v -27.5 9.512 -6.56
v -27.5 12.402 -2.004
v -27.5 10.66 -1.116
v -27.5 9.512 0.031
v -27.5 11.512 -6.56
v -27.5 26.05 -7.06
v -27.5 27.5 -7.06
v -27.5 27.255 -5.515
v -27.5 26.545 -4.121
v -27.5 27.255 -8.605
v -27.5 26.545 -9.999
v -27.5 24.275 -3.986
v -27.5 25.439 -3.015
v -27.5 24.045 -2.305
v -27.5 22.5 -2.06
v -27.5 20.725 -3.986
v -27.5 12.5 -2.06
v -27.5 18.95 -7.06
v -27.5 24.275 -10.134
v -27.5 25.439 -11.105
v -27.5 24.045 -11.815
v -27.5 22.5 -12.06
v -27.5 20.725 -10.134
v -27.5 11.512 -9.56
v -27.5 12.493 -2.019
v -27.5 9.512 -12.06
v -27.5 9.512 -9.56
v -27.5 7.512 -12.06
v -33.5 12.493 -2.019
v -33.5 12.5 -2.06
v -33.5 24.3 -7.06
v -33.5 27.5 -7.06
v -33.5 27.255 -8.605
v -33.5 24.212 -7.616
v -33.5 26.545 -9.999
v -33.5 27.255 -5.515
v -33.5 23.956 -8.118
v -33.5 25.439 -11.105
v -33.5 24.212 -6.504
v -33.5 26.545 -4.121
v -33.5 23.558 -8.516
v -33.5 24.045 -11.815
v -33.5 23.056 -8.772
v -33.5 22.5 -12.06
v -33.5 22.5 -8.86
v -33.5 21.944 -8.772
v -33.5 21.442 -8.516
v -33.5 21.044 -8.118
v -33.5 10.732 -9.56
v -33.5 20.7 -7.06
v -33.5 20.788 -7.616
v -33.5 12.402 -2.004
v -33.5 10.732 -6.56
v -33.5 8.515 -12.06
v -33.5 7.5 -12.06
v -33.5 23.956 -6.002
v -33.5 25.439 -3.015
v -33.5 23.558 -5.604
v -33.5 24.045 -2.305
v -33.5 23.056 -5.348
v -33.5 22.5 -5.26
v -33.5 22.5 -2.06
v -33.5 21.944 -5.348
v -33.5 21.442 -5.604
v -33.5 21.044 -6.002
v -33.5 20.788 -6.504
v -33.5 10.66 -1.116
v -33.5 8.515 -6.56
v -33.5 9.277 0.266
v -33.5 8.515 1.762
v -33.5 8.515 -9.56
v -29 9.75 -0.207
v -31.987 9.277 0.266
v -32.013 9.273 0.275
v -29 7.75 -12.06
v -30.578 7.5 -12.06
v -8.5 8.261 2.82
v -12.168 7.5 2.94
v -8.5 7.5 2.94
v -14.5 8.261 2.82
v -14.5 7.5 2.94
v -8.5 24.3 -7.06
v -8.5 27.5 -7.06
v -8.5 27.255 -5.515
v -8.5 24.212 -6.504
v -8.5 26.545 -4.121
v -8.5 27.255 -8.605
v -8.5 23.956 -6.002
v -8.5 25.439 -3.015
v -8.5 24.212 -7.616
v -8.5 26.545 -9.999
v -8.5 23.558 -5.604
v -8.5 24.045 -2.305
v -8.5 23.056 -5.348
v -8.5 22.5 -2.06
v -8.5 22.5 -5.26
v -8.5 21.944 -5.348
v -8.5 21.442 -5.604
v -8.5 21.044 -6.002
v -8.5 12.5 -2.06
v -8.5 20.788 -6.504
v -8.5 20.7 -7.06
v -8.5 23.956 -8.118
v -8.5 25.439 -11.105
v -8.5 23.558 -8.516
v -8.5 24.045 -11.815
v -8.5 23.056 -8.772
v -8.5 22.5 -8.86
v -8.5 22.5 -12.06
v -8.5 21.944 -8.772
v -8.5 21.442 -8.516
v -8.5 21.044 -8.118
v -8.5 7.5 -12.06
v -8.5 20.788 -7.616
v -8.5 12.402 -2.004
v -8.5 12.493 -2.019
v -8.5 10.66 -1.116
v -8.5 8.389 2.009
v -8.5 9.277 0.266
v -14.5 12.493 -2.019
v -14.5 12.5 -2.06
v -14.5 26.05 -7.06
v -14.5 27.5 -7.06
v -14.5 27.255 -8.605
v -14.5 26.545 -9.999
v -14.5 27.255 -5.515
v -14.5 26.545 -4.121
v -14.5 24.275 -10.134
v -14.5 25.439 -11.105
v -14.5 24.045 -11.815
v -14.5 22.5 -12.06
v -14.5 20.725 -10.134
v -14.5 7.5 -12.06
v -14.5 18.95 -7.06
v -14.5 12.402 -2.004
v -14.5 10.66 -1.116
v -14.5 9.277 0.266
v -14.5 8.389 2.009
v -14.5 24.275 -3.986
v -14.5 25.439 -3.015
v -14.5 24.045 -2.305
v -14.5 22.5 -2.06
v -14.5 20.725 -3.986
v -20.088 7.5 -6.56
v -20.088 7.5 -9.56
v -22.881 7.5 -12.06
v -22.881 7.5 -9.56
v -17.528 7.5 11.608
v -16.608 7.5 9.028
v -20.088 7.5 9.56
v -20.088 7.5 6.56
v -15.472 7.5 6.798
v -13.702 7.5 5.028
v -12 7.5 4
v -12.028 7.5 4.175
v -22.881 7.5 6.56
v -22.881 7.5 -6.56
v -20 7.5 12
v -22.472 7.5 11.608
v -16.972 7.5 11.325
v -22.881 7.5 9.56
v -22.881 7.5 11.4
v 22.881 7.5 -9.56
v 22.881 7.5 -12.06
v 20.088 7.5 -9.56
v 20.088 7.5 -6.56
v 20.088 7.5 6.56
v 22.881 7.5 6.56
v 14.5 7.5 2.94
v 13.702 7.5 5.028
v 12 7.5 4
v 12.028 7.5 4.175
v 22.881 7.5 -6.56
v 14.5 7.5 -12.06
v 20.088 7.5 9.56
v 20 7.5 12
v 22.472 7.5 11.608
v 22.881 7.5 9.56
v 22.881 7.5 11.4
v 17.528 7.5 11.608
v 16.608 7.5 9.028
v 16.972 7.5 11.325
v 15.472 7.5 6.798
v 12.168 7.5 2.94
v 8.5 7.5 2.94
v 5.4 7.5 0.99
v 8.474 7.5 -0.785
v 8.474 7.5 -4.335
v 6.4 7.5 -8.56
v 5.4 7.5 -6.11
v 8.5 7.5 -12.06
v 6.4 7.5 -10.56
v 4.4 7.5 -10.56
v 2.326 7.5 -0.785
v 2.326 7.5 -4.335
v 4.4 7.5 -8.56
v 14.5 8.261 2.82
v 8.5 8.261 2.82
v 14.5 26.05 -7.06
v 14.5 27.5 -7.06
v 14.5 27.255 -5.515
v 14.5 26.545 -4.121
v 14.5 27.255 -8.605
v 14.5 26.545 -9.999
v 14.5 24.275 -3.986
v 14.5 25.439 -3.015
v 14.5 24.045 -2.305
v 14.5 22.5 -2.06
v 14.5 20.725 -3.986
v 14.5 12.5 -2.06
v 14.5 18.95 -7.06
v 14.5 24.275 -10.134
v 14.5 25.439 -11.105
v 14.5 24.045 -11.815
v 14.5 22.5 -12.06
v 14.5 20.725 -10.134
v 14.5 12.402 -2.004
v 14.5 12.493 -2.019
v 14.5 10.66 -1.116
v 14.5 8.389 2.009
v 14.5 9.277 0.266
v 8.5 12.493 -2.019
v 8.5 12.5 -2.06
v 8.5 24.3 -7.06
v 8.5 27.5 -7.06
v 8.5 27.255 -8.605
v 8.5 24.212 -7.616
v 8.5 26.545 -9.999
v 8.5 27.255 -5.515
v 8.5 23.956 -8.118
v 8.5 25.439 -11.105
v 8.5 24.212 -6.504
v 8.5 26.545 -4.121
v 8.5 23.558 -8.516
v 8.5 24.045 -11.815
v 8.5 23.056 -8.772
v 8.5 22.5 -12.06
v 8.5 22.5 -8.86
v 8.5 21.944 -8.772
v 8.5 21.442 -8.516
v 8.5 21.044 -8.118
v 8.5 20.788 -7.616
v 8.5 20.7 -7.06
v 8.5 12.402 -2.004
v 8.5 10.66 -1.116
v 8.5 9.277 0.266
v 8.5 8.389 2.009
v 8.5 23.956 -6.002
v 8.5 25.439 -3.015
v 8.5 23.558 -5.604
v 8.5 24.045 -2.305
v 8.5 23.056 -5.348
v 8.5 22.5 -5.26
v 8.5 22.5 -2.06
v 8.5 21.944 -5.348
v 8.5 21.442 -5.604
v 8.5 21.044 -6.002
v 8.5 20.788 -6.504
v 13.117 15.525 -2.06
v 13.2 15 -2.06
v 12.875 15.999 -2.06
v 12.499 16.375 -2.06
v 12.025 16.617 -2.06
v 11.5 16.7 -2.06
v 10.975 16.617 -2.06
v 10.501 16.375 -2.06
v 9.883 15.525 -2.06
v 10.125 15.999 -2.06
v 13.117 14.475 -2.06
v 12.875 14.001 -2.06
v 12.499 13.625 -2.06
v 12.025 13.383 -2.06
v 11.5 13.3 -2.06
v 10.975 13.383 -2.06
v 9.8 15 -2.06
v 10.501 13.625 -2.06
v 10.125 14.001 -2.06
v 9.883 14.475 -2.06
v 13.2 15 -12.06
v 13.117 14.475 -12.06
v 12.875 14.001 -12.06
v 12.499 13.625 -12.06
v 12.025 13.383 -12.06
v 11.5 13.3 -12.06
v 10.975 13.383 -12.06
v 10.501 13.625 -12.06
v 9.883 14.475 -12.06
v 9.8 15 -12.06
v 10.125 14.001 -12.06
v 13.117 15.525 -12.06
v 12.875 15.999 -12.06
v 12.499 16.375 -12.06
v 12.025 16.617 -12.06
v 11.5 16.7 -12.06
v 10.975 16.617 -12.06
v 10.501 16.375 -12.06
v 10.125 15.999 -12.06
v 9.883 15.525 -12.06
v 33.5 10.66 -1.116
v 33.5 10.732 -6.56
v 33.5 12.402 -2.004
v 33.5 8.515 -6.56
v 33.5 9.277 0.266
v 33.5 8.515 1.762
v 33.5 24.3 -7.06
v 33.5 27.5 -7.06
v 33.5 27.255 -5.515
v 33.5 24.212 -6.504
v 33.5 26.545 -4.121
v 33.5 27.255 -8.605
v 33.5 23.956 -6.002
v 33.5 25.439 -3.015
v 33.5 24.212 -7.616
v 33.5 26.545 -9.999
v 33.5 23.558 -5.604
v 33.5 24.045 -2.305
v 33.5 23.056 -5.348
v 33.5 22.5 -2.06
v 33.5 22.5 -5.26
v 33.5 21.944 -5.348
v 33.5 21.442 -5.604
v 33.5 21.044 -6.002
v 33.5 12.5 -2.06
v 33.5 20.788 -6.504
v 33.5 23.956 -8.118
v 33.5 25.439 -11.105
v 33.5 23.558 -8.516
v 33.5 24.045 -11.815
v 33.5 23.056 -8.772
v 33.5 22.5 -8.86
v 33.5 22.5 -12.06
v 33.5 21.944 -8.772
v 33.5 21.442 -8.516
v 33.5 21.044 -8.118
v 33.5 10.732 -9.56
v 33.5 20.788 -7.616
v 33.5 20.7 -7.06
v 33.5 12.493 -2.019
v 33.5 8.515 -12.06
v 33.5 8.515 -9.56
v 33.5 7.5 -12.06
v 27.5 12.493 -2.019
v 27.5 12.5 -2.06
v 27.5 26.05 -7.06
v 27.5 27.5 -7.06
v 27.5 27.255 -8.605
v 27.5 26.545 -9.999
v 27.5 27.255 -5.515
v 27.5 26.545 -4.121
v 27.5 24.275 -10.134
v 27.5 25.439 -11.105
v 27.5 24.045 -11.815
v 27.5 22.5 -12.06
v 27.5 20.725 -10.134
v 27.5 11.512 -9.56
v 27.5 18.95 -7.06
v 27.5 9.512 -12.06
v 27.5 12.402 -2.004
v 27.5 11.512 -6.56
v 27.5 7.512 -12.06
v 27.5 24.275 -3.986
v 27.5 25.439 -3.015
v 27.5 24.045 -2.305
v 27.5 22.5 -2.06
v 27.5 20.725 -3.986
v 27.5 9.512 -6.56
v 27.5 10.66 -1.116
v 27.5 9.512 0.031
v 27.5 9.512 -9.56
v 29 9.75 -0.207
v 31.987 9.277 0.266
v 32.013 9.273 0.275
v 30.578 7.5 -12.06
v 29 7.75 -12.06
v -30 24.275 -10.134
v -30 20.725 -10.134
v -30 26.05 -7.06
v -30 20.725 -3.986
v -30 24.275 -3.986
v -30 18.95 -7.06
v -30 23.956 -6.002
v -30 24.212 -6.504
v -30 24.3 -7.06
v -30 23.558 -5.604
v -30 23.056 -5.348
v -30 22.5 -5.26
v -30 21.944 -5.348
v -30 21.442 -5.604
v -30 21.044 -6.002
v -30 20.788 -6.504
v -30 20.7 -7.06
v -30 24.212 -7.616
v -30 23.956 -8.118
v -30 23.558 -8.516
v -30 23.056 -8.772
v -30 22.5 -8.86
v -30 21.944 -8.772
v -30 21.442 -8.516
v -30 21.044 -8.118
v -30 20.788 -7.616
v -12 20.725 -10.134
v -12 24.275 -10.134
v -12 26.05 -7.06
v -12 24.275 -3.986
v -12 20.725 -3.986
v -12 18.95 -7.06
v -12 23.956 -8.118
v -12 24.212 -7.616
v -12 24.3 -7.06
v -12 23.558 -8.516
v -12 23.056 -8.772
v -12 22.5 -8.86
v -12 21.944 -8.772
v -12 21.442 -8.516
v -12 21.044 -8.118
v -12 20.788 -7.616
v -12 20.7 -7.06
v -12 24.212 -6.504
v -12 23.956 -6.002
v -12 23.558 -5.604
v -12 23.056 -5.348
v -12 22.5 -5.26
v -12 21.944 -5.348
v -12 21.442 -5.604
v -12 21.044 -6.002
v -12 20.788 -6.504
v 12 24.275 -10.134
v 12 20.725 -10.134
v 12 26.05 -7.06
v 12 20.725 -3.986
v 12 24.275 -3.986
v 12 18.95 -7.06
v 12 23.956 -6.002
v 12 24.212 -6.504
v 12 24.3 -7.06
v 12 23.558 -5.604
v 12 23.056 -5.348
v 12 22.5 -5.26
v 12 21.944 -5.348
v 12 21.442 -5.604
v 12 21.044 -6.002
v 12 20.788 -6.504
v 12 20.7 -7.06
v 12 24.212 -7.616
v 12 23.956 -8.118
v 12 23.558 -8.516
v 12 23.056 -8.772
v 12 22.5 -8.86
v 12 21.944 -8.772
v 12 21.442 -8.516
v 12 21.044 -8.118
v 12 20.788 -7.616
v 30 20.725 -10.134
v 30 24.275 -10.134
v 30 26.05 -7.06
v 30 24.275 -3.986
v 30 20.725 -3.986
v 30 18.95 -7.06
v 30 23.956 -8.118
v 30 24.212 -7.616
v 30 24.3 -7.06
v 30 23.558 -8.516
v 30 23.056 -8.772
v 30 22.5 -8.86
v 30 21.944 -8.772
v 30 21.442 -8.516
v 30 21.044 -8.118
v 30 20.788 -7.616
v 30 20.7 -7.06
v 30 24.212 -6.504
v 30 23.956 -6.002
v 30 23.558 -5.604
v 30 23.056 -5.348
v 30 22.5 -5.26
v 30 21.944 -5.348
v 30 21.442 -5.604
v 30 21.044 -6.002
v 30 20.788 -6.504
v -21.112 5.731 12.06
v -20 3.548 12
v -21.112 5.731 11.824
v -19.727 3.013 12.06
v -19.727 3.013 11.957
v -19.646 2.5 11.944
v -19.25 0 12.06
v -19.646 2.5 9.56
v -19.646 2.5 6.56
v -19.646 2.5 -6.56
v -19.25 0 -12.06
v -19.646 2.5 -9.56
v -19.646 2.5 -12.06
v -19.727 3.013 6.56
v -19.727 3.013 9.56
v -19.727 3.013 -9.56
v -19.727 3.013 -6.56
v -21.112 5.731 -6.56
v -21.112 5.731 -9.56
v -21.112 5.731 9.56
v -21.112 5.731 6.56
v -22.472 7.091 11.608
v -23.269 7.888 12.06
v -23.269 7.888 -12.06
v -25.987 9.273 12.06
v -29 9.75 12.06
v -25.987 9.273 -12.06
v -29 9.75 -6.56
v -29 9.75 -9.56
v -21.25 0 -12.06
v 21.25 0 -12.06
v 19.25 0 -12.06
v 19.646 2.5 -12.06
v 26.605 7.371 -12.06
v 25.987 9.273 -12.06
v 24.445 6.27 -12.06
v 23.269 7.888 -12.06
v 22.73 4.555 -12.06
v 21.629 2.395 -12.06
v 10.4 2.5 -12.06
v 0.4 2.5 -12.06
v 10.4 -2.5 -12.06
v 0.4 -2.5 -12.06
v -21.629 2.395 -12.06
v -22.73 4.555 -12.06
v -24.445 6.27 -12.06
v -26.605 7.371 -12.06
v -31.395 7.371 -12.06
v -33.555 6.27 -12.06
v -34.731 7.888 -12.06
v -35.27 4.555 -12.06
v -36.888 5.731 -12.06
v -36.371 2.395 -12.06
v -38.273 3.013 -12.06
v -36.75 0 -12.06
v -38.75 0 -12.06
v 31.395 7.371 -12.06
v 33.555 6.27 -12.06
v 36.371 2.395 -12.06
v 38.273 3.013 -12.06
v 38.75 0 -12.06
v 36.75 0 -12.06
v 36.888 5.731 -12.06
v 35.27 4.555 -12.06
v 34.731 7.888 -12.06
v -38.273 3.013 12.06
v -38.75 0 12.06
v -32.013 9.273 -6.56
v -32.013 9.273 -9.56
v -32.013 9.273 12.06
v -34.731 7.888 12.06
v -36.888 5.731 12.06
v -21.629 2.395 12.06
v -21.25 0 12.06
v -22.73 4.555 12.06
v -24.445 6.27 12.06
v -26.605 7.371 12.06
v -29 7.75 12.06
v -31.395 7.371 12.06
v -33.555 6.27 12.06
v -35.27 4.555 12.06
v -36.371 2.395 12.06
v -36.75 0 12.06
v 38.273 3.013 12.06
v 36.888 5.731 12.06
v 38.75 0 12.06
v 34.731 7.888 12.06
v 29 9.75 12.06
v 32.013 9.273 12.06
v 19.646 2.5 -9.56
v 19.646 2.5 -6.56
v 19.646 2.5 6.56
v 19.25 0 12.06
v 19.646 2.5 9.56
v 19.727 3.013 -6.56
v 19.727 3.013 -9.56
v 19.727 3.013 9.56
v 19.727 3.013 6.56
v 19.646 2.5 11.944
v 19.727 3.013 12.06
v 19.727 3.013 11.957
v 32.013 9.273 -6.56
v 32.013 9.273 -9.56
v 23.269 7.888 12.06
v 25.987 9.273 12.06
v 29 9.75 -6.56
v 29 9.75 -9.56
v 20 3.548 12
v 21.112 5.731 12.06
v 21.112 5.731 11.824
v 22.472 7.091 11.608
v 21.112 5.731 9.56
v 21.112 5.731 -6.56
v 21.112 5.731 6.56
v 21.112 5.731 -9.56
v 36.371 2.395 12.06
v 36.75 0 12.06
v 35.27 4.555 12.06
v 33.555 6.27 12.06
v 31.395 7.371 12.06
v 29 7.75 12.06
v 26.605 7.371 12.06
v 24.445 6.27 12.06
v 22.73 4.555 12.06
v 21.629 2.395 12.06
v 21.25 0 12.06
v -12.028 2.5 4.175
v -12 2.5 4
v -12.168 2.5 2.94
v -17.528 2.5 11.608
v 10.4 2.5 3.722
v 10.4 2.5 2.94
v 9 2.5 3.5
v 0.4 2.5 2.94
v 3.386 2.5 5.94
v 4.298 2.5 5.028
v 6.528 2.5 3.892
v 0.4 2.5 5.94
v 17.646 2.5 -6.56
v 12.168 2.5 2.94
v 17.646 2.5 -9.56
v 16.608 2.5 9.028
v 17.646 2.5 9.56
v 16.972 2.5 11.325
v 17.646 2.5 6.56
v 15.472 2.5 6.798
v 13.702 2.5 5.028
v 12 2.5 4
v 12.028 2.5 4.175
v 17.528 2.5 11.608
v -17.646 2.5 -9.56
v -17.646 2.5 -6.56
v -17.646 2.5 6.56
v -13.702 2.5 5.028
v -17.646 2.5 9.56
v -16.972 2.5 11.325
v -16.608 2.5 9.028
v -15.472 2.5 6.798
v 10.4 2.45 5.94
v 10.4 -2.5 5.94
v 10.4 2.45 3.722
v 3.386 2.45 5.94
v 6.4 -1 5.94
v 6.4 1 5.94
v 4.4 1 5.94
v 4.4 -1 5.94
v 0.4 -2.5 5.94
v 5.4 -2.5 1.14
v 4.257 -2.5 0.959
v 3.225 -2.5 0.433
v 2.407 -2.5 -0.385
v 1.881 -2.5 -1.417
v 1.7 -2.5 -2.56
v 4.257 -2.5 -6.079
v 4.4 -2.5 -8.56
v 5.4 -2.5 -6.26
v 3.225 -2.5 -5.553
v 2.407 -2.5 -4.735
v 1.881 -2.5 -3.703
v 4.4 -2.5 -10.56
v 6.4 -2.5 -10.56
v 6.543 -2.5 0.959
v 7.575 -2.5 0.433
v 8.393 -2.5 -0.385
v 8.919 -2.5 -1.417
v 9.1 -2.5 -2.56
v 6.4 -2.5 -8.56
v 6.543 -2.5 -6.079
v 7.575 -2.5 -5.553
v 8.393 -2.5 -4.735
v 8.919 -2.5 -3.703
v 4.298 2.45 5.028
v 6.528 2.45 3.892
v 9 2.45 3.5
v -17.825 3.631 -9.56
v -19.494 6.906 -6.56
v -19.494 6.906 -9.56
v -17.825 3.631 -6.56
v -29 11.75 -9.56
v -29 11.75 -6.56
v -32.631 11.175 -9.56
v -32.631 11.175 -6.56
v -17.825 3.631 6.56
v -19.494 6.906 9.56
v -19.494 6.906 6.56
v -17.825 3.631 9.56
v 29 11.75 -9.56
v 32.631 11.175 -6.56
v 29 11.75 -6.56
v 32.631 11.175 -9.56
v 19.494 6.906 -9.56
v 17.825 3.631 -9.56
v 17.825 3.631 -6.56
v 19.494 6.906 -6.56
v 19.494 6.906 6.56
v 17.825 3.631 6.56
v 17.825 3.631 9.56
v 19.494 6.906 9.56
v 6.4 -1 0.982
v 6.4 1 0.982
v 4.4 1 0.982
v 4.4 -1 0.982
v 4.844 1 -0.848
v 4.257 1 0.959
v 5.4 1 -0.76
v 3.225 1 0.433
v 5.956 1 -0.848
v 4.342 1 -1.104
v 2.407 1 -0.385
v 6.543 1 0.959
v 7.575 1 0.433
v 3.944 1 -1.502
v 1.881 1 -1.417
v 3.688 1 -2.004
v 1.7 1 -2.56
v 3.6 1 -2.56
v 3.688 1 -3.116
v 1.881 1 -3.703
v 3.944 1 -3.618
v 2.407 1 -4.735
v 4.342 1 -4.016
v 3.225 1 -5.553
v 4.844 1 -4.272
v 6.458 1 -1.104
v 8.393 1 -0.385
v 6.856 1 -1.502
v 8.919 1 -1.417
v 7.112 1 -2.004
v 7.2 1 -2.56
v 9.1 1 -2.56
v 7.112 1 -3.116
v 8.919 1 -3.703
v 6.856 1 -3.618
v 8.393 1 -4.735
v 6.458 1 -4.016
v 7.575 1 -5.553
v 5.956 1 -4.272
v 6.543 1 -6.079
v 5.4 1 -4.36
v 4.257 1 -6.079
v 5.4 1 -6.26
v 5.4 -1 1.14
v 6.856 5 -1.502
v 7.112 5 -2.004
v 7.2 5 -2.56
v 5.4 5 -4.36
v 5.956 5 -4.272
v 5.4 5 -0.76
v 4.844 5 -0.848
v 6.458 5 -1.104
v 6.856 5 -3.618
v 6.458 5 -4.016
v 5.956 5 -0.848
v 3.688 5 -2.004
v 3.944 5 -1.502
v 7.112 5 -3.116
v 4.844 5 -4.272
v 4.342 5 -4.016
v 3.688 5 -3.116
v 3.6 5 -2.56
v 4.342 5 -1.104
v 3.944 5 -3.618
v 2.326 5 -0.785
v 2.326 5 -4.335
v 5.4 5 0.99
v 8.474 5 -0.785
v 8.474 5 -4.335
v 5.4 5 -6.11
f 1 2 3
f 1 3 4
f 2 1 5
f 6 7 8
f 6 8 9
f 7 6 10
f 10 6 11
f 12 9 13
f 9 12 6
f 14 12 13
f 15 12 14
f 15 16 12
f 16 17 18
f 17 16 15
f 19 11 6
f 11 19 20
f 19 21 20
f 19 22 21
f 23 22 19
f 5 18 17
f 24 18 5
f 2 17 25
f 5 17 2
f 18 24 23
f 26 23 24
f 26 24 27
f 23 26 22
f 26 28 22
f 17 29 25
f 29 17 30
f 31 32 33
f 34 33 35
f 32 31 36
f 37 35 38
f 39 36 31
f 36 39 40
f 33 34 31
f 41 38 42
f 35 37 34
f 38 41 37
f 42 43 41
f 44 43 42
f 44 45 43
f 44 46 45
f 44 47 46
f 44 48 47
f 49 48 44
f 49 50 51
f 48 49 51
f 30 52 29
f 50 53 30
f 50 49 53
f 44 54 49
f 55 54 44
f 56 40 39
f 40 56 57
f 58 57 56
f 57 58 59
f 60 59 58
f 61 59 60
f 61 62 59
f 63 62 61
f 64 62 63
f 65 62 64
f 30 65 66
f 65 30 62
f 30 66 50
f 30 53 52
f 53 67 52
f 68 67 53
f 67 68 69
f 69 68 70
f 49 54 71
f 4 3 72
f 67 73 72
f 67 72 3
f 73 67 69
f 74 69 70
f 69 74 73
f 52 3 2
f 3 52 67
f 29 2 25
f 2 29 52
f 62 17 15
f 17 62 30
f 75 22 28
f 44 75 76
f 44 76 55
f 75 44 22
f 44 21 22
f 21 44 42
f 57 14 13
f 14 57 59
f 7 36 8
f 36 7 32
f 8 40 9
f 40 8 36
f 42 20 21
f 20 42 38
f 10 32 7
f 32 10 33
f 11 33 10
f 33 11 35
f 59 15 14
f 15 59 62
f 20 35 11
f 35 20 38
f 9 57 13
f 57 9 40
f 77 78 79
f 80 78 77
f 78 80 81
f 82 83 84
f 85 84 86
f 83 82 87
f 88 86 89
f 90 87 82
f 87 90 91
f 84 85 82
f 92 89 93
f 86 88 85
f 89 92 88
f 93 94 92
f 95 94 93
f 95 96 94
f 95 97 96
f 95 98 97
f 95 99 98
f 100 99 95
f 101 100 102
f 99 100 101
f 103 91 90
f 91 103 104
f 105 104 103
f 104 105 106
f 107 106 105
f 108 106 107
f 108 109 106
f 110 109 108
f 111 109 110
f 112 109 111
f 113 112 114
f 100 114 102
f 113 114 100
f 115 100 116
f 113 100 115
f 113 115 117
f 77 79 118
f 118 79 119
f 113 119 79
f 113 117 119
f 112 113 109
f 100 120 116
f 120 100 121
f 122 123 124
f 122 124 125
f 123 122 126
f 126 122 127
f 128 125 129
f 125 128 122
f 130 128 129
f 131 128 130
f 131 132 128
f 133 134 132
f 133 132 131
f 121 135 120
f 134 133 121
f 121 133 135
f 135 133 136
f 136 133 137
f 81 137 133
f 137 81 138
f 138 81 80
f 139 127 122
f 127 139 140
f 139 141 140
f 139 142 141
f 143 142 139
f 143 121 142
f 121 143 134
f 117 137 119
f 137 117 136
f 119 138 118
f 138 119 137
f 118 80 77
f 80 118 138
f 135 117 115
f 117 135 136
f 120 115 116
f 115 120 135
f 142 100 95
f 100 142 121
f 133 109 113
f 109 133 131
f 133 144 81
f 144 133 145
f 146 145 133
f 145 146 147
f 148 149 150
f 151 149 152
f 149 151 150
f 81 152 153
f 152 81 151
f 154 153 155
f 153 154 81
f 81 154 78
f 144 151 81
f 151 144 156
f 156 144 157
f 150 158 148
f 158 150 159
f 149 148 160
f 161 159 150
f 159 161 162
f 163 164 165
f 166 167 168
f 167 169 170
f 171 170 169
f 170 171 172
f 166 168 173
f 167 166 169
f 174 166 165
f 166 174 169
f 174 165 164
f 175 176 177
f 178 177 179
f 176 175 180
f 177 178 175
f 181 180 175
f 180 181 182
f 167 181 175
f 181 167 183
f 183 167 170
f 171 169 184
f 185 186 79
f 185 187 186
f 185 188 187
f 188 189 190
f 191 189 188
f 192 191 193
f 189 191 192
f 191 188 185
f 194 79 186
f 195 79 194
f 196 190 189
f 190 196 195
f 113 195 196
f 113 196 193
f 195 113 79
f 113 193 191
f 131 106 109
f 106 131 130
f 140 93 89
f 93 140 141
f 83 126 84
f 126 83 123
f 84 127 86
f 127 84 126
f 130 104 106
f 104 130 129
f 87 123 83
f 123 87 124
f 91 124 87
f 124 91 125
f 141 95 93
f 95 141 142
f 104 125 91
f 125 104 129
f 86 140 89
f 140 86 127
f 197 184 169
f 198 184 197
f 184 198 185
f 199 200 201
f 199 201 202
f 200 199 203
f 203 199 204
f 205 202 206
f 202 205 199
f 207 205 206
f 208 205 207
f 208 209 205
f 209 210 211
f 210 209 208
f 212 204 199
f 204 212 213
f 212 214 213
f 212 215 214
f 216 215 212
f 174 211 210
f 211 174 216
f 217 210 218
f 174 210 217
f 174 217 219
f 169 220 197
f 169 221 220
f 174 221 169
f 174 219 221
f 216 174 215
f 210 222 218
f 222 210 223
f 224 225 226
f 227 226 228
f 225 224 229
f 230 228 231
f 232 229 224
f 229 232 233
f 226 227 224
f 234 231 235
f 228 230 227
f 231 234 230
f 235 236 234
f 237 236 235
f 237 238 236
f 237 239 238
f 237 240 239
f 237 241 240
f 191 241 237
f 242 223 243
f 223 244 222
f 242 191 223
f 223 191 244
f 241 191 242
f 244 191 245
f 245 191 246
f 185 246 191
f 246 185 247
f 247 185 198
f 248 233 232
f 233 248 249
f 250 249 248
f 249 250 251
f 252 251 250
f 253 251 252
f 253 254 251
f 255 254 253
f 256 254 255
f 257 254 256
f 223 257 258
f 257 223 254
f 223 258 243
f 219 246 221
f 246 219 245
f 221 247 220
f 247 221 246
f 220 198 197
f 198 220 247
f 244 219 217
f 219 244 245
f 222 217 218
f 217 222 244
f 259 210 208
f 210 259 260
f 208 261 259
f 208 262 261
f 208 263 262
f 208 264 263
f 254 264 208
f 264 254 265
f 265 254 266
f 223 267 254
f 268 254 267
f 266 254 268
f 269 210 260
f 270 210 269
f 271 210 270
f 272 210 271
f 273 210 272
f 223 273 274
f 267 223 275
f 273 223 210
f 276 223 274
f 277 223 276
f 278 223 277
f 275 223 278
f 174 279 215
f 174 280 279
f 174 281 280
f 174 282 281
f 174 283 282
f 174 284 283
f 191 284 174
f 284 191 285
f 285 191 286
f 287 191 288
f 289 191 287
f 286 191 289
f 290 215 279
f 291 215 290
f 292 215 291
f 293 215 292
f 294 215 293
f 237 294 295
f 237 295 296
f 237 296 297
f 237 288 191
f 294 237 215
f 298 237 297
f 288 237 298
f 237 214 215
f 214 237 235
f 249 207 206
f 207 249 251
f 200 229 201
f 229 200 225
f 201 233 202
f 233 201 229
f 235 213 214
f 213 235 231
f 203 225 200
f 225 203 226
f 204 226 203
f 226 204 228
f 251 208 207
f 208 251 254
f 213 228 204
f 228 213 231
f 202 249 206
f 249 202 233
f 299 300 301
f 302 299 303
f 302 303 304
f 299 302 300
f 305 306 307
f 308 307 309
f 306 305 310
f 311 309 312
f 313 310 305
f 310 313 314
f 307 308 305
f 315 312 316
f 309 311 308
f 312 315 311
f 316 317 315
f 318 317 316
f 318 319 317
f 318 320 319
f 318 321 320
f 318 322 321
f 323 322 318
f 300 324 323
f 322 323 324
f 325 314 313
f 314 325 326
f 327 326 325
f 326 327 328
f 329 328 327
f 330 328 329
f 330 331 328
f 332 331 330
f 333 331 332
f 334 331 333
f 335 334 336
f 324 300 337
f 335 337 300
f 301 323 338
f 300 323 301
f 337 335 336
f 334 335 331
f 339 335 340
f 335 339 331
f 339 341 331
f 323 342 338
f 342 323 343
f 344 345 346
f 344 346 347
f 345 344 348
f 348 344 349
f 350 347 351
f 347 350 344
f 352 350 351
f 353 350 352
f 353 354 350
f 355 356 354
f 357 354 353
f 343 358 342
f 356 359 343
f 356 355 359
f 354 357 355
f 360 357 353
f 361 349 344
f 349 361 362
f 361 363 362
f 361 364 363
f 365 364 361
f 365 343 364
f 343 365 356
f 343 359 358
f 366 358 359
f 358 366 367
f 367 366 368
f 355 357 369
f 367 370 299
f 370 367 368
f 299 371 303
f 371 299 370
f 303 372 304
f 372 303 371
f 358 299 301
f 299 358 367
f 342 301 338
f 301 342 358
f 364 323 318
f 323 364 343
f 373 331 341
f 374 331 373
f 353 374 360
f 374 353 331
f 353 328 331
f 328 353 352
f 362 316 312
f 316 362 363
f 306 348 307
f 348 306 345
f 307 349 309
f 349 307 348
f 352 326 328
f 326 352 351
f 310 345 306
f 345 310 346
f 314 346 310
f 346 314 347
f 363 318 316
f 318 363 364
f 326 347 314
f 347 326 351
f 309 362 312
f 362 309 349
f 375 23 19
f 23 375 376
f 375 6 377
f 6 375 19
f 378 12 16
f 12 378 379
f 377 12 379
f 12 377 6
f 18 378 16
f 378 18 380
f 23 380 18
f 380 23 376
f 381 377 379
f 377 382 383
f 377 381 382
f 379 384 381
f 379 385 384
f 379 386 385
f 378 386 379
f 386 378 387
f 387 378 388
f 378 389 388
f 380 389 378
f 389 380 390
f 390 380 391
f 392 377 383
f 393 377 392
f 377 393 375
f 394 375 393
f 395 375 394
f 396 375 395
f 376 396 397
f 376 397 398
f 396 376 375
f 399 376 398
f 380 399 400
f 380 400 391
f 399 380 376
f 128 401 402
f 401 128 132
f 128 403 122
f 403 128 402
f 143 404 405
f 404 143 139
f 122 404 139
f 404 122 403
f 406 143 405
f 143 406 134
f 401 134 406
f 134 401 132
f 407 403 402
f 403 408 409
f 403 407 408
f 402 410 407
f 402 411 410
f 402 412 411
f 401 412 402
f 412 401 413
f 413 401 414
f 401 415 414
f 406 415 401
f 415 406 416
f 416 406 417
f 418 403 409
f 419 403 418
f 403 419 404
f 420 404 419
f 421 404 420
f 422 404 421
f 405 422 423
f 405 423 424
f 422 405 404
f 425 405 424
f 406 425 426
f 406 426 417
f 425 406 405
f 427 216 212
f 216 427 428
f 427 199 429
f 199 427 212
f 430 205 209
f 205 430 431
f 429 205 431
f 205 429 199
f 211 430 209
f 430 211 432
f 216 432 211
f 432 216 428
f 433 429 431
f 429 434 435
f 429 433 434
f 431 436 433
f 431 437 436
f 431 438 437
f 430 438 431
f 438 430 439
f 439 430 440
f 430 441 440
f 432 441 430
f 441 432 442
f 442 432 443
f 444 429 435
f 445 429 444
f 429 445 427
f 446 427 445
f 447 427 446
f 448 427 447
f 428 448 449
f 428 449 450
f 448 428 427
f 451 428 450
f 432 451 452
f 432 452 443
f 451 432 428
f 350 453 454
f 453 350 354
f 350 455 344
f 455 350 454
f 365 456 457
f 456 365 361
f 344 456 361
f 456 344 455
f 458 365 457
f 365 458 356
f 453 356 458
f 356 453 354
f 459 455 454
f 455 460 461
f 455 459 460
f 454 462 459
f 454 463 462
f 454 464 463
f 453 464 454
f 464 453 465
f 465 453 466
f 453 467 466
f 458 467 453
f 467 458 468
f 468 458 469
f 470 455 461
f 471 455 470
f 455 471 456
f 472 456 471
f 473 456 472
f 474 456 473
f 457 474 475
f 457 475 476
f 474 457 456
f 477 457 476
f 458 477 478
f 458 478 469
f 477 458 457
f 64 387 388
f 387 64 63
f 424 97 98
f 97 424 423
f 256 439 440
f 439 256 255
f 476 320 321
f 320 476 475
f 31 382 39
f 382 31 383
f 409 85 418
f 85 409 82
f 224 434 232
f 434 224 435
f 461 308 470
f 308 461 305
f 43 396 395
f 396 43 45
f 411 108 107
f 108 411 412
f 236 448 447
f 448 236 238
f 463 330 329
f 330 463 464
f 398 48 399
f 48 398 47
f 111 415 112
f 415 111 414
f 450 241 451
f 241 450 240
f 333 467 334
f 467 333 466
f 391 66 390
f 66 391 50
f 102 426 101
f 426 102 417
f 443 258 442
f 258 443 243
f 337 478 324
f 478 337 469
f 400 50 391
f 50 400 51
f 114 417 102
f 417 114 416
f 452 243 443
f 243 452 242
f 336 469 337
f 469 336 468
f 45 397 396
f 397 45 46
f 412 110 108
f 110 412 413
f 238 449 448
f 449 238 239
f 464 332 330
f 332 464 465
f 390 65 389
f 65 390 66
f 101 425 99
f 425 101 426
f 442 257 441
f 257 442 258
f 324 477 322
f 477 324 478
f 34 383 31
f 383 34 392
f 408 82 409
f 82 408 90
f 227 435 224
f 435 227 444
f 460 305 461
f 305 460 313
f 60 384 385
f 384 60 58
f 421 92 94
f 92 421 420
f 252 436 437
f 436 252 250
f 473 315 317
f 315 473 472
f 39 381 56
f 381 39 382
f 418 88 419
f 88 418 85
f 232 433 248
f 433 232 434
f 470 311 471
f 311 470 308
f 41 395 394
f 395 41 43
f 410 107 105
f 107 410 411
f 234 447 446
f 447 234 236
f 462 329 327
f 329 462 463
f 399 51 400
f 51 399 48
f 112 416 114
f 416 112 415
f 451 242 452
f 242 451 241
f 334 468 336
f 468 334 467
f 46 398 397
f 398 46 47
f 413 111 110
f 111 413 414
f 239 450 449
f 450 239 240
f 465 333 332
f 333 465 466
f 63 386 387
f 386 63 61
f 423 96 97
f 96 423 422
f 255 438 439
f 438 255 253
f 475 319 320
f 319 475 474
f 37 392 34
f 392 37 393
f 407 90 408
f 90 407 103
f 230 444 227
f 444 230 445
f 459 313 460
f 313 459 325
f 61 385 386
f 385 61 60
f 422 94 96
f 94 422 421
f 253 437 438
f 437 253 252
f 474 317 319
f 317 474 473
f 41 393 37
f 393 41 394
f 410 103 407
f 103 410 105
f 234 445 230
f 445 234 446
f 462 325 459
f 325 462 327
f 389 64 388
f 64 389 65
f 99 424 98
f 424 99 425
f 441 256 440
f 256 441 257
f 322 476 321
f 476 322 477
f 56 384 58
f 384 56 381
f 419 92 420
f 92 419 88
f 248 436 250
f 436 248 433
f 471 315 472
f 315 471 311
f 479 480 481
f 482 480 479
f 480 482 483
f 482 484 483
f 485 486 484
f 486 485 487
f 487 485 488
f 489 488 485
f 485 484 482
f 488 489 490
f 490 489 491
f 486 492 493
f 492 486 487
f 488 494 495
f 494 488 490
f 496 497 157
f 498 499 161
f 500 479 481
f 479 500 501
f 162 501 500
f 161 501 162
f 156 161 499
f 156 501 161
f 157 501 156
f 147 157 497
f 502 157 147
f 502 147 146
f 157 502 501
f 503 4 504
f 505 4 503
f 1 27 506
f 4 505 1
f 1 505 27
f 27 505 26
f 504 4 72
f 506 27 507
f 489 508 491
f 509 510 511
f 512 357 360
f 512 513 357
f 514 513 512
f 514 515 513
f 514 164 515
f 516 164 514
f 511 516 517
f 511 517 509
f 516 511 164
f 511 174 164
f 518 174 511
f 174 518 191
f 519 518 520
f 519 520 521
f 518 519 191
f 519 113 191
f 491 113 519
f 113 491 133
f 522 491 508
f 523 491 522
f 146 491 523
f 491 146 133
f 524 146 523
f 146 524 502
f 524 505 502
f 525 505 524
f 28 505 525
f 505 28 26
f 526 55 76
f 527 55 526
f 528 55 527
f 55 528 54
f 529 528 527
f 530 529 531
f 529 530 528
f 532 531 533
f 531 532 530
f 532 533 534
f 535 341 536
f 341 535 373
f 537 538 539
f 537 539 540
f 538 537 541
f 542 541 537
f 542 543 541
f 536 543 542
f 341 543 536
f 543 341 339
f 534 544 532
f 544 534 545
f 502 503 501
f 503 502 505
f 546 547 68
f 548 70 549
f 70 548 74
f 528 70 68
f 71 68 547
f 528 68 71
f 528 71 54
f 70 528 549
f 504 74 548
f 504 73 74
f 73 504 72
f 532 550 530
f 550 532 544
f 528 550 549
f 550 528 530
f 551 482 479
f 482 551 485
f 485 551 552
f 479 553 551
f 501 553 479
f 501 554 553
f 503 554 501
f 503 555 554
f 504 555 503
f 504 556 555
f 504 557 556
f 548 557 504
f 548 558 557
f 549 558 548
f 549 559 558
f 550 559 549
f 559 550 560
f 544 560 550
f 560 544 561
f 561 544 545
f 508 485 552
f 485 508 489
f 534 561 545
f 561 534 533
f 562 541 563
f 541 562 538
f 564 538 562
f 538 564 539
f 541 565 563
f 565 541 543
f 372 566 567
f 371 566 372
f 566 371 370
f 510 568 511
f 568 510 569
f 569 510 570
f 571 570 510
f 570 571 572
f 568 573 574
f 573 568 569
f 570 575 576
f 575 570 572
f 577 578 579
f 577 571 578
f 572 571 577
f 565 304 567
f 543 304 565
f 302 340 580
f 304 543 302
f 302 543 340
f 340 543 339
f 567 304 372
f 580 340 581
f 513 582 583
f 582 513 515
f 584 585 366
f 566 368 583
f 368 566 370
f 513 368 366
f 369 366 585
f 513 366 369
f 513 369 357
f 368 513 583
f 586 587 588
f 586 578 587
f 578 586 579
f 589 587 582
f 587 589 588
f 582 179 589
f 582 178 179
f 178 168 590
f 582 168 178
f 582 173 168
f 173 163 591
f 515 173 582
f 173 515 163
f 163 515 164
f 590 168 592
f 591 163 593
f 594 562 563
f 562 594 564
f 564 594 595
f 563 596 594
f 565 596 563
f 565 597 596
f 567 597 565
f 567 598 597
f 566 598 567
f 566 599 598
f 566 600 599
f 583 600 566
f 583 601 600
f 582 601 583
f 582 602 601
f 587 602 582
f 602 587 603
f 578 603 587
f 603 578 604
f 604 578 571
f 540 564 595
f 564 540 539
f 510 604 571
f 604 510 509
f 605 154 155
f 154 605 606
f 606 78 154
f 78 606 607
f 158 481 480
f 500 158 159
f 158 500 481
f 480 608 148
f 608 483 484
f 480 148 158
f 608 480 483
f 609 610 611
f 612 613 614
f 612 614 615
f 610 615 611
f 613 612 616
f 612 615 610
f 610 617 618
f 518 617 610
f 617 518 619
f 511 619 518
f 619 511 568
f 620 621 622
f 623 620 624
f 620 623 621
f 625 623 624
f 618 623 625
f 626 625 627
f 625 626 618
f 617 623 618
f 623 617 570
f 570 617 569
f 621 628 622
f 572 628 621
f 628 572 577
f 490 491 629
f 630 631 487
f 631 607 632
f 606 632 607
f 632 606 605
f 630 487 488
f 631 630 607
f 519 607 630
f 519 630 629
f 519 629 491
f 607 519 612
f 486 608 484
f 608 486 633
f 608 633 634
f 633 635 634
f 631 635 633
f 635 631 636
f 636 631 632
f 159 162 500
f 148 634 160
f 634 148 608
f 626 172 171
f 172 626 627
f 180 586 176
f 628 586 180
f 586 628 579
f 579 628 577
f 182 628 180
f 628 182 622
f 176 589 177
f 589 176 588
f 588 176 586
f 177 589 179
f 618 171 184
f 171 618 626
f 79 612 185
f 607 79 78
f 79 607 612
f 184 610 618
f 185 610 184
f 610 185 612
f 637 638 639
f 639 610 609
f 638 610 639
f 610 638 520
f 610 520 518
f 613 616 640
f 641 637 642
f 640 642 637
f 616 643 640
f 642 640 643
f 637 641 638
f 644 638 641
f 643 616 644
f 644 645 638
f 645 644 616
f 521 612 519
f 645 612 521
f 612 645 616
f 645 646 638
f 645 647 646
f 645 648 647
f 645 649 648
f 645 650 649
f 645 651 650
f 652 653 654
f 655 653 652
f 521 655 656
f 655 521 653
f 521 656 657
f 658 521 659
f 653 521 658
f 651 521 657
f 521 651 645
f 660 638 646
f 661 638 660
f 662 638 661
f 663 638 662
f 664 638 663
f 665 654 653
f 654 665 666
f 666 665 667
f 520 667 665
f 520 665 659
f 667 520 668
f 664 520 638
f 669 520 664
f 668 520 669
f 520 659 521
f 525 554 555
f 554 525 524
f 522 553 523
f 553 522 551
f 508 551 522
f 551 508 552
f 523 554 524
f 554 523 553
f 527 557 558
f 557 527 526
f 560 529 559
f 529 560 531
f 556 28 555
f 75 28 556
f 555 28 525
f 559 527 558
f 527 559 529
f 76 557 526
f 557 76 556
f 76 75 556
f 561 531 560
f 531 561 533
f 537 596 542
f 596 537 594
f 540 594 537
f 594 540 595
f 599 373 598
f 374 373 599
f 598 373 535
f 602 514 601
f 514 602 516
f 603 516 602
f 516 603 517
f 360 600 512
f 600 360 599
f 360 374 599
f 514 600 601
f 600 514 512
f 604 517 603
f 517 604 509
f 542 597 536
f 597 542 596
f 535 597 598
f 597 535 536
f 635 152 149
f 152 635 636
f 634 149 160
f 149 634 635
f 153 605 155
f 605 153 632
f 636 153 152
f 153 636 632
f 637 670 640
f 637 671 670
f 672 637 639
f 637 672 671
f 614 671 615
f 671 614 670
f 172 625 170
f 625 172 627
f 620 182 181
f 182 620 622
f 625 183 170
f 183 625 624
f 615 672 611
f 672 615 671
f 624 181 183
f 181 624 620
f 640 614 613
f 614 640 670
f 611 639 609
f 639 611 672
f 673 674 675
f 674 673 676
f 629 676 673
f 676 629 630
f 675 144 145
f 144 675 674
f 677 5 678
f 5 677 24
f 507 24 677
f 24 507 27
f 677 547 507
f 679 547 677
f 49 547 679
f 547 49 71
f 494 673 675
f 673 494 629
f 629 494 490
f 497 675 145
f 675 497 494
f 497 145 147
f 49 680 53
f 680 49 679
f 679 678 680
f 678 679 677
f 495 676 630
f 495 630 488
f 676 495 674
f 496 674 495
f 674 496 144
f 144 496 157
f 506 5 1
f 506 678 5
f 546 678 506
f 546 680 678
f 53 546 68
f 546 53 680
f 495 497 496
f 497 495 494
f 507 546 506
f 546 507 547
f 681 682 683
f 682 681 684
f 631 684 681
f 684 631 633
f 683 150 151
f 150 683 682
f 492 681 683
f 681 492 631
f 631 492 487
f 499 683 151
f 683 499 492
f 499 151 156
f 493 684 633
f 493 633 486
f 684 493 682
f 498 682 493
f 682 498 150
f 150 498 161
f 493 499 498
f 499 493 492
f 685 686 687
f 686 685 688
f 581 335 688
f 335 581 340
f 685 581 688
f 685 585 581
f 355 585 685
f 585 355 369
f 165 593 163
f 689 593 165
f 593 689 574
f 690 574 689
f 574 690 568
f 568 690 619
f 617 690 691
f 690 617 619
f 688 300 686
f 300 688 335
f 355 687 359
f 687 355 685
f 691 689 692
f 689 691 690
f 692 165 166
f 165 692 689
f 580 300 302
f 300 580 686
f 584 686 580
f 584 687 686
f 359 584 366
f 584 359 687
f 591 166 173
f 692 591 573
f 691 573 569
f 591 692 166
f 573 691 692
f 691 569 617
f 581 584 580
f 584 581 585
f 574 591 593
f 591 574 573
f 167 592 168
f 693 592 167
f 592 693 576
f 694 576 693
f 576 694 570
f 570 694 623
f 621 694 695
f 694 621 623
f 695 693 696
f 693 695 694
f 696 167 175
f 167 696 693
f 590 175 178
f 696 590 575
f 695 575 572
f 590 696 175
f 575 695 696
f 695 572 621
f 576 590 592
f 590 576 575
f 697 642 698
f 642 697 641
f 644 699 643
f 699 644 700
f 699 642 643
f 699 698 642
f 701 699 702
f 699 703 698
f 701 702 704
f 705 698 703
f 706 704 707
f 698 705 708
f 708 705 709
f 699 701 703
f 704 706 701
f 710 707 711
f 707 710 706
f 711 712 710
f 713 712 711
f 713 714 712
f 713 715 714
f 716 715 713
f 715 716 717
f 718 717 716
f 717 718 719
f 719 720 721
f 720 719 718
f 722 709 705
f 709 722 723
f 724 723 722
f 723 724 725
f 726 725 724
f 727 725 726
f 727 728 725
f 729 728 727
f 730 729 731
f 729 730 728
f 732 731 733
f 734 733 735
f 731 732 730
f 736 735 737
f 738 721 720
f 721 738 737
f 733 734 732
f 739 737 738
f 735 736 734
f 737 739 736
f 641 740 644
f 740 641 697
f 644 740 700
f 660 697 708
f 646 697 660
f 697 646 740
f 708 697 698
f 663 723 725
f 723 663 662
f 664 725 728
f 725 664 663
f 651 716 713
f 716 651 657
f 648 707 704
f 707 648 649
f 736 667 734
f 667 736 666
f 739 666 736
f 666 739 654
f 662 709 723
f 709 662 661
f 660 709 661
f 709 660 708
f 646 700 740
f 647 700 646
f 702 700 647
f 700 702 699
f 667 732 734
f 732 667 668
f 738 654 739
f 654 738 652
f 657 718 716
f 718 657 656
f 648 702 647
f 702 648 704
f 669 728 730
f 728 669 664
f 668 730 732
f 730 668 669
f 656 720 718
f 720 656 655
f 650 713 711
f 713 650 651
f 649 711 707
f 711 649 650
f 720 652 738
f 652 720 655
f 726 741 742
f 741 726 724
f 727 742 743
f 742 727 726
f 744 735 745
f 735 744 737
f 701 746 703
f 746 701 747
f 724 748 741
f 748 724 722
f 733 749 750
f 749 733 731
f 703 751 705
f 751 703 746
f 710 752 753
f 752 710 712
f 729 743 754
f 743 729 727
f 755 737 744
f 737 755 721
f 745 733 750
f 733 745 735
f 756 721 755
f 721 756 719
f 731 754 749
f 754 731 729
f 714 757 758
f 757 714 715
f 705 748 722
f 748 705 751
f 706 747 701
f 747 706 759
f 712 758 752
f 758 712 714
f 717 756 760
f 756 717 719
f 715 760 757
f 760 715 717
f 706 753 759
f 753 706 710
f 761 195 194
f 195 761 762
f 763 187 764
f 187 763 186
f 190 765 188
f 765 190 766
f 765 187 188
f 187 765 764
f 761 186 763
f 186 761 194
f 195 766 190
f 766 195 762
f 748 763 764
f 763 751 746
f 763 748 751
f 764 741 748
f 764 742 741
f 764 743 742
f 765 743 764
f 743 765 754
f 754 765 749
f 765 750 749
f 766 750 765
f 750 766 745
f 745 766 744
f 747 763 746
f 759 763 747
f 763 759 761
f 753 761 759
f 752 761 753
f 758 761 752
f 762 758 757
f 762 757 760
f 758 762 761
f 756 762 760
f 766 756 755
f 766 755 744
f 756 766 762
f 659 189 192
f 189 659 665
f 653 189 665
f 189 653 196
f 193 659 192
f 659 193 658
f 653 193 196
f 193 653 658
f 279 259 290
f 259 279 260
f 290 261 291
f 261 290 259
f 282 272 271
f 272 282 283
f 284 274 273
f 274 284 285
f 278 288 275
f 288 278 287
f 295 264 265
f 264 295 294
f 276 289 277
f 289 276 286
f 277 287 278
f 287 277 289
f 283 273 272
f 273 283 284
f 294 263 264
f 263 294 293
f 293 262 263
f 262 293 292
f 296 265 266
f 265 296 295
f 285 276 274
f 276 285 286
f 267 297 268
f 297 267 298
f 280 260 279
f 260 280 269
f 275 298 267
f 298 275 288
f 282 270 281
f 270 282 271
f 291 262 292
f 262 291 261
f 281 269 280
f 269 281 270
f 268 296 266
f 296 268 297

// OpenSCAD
// file: hotend_clamp.scad
include<configuration.scad>;

$fn=60;
clamp_h = 2.31;
ubis_gap = 11.65;


module clamp(){
	difference(){
		union(){
			for(i=[0:120:240]){
				hull(){
					rotate([0,0,i]) translate([33,0,0]) cylinder(r=6,h=clamp_h,center=true);
					cylinder(r=6,h=clamp_h,center=true);
				}
			}
			cylinder(r=ubis_gap/2+5,h=clamp_h,center=true);
		}


		for(i=[0:120:240]){
			rotate([0,0,i]) translate([32,0,0]) cylinder(r=M4/2,h=clamp_h+1,center=true);
		}
		
		cylinder(r=ubis_gap/2,h=clamp_h+1,center=true);
		hull(){
			cylinder(r=ubis_gap/2-1,h=clamp_h+1,center=true);
			translate([-30,0,0]) cylinder(r=ubis_gap/2-1,h=clamp_h+1,center=true);
		}

	}
}



//DRAWING

clamp();
// file: platform.scad
include<configuration.scad>;
use<hotend_clamp.scad>;
$fn=20;

plat_h = 8;


module ubis(){
	ubis_l = 70-2.31-4.3;

	translate([0,0,ubis_l+5/2+2.31+4.3/2]) cylinder(r=15.89/2,h=4.3,center=true);
	translate([0,0,ubis_l+5/2+2.31/2]) cylinder(r=11.6/2,h=2.31,center=true);
	translate([0,0,ubis_l/2+5/2]) cylinder(r=15.89/2,h=ubis_l,center=true);
	cylinder(r2=15.89/2,r1=3,h=5,center=true);
}




module platform(){

	difference(){
		union(){
			hull() for(i=[0:120:240]){

				rotate([0,0,i]) translate([20,0,0]) cube([10,arm_sep+20,plat_h],center=true);



			}
		}

		hull() for(i=[0:120:240]){
			rotate([0,0,i]) translate([-20,0,0]) cylinder(r=5,h=plat_h+1,center=true);
		}
		for(i=[0:120:240]){
			rotate([0,0,i]) translate([-32,0,0]) cylinder(r=M4/2,h=plat_h+1,center=true);
		}	
	}
	

}





/********DRAWING********/

%translate([0,0,-20]) ubis();
platform();

%translate([0,0,47]) rotate([0,0,60]) clamp();
#translate([0,0,20]) for(i=[0:120:240]){
	rotate([0,0,i]) translate([-32,0,0]) cylinder(r=M4/2,h=60,center=true);
}	
// file: jaws.scad
include<configuration.scad>;

thickness = 6;
gap = 10;

h = (thickness+gap)/2;
r = h/2 / cos(30);




module jaws() {
  difference() {
    union() {
      intersection () {
        rotate([90, 0, 0]) cylinder(r=5, h=gap+thickness, center=true, $fn=24);
        translate([-4, 0, 0]) cube([10, gap+thickness, h], center=true);
      }
      intersection() {
        translate([10, 0, 0]) cube([26, gap+thickness, h], center=true);
        translate([10, 0, 0]) rotate([0, 90, 0]) rotate([0, 0, 30]) cylinder(r1=gap, r2=r, h=26, center=true, $fn=6);
      }
	
    }
	
	//Makin it look nice
    translate([-1.5, 0, 0]) cube([10, gap, 10], center=true);
    translate([3.5, 0, 0]) rotate([0, 0, 30]) cylinder(r=gap/2, h=10, center=true, $fn=6);
    translate([4, 0, 4]) rotate([0, 45, 0]) rotate([0, 0, 30]) cylinder(r=4.2, h=8, center=true, $fn=6);
    translate([4, 0, -4]) rotate([0, -45, 0]) rotate([0, 0, 30]) cylinder(r=4.2, h=8, center=true, $fn=6);

	//M3 Holes
    rotate([90, 0, 0]) cylinder(r=M3h/2, h=40, center=true, $fn=12);



  }
}

translate([-50, 0, 0]) jaws();
translate([50,0,0]) mirror([1,0,0]) jaws();
translate([0, 0, 0]) rotate([90, 0, 90]) cylinder(r=r, h=80, center=true, $fn=6);
// file: idler_end.scad
include<configuration.scad>;
use<modules.scad>;
use<platform.scad>;


//VARIABLE
side_length = pole_center*0.866025;
side_width = 20;
idler_height = 16;

switch_hole_sep = 9.5;



//Testers
$fn=50;
draw_all = 0; //




//Modules
module nema17(){

	cube([42,47.5,42],center=true);
	translate([0,47.5/2+25/2,0]) rotate([90,0,0]) cylinder(r=2.5,h=25,center=true);
	translate([0,47.5/2+25/2+4,0]) rotate([90,0,0]) cylinder(r=10,h=25,center=true); //The pulley
}


module m8poles(){

	for(i=[-1,1,1]){
		translate([i*rod_sep,0,0]) cylinder(r=M8/2,h=rod_height,center=true);

	}
}

module idler_end(){
	union(){
		difference(){
			union(){ //Getting the basic shape
				for(i=[-1:2:1]){
					rotate([0,0,i*30]) translate([i*(30-side_width/2),-side_length/2-19,0]) side_mount(i);
					translate([i*rod_sep,0,0]) rotate([0,0,0]) cylinder(r=M8/2+2.5,h=idler_height,center=true);
					translate([i*(rod_sep-4),-8,0]) rotate([0,0,0]) cylinder(r=8,h=idler_height,center=true);
					translate([0,-15,0]) cube([50,6,idler_height],center=true);


					translate([-18,-28,0]) cube([4,20,idler_height],center=true);
					translate([-28,-28,-5.5]) cube([20,20,5],center=true);
				}
			}

		translate([0,0,rod_height/2+42/2-21]) m8poles();
		rotate([90,0,0]) cylinder(r=M8h/2,h=50,center=true);
		//%rotate([90,0,0]) cylinder(r=17.3/2,h=50,center=true);

		


		for(i=[-1:2:1]){
			translate([i*(rod_sep-13),-5,0]) rotate([0,0,0]) cylinder(r=8,h=idler_height+1,center=true);
			translate([i*40,-36,0]) rotate([0,0,0]) cylinder(r=M3/2,h=idler_height+1,center=true);

			translate([-15,i*(switch_hole_sep/2)-30,3]) rotate([0,90,0]) cylinder(r=M3h/2,h=20,center=true);
		}
		

		}
		//difference(){
			
			//Idler Bar
		//	translate([0,-15,0]) cube([50,6,idler_height],center=true);
	
		//	rotate([90,0,0]) cylinder(r=M8h/2,h=50,center=true);
		//}
		

	}
	//%translate([0,0,rod_height/2+42/2]) m8poles();

}


module motor_holes(){
	for(i=[-1,1,1]){
		translate([0,0,i*31/2]) for(i=[-1,1,1]){
			translate([i*32/2,0,0]) rotate([90,0,0]) cylinder(r=M3h/2,h=20,center=true);
			translate([i*32/2,0,0]) rotate([90,0,0]) cylinder(r=M3h/2,h=10,center=true);
		}
	}
}

module side_mount(a){

	difference(){
		cube([side_width,side_length,idler_height],center=true);

		translate([-5*a,-2,5]) cube([side_width,side_length-16,idler_height],center=true);

		for(i=[-1,1,1]){
			translate([0,-30,2]) rotate([90,0,0]) cylinder(r=M4h/2,h= 40,center=true);

			translate([0,0,2]) rotate([0,90,0]) cylinder(r=4,h= 40,center=true,$fn=4);


			//translate([0,-23,idler_height/2]) cylinder(r=M3/2,h= 10,center=true);
			//translate([-2.5,-26.5,idler_height/2-7]) cube([5,11,3]);

		}
	}

}


 
/************************DRAWING************************/

if (draw_all == 1){

	for(i=[0:120:270]){

		rotate([0,0,i]) translate([0,80.6,0]) idler_end();
		//%translate([0,0,100]) cylinder(r=50,h=100,center=true);

	}
}
if(draw_all == 0){
	idler_end();
}



//side_mount();


//motor_holes();
//rotate([0,0,-30]) translate([0,0,100]) platform();
// file: modules.scad
module hollow_cylinder(r1,r2,h,cent,fn){
	difference(){
		cylinder(r=r1,h=h,center=cent,$fn=fn);
		cylinder(r=r2,h=h+.1,center=cent,$fn=fn);
	}
}
// file: configuration.scad
//Configuration File
//Lets you adjust pretty much everything
//
//Makes it all super paramatric
//


//Configuration Block
$fn = 20;
module configBlock(){
	difference(){
		cube([15,30,10],center=true);

		union(){  //Vertical Holes
			translate([0,10,5]) rotate([0,0,0]) cylinder(r=M3/2,h=10,center=true);
			translate([0,3,5]) rotate([0,0,0]) cylinder(r=M4/2,h=10,center=true);
			translate([0,-8,5]) rotate([0,0,0]) cylinder(r=M8/2,h=10,center=true);
		}

		union(){  //Horizontal Holes
			translate([-8,10,0]) rotate([0,90,0]) cylinder(r=M3h/2,h=10,center=true);		
			translate([-8,3,0]) rotate([0,90,0]) cylinder(r=M4h/2,h=10,center=true);
			translate([-10,-6,0]) rotate([0,90,0]) cylinder(r=M3nut/2,h=10,center=true,$fn=6);

			translate([10,3,0]) rotate([0,90,0]) cylinder(r=M3washer/2,h=10,center=true);


			//translate([0,-8,0]) rotate([0,90,0]) cylinder(r=M8/2,h=10,center=true);
		}
	}
}

//configBlock();

//Bolts
M3 = 4;
M4 = 5;
M8 = 9;

M3h = 3.6;  //Horizontal versions
M4h = 5;  //Horizontal versions
M8h = 8; //Horizontal versions

//Nuts & Washers

M3washer = 7.4;
M3nut = 7.1;

//Size of other parts
rod = 8;  //Dimension of smooth rod
lm8uu = 16;

/*************************
 Printer Design files now
**************************/

//basic
arm_length = 100 ; //Length of the arms based on a planned 100x100 print size
pole_center = 60 ; //The pole distance from the center of the print
rod_sep = 25 + rod/2; // pole to pole seperation for one set. Includes rod length
rod_height = 260;

//motor end effector


//Universal joints
//holewidth = 6;
//arm_sep = 40;



//Hotend
// main file
include<configuration.scad>;
use<modules.scad>;
use<idler_end.scad>;
use<jaws.scad>;

//VARIABLES

lm8uu_r = 15.5/2;  //Gotta check this
lm8uu_h = 24.12;
height = 15;
thick = 5;



ten_pos = 5.4;  //Position of tensioner in x-axis
pos_tem = 2; //temporary variable



cubex = 6;
cubey = 15;
cubez = 10;
cubie = [cubex,cubey,cubez];

arm_sep = 21;
swivel_sep = 13+cubex;



//MODULES
module m8poles(){
	for(i=[-1:2:1]){
		translate([i*rod_sep,0,0]) cylinder(r=M8/2,h=rod_height,center=true);
	}
}
module lm8uu(h){
	for(i=[-1:2:1]){
		translate([i*rod_sep,0,0]) cylinder(r=lm8uu_r,h=h,center=true);

	}
}




module carriage(){
	difference(){
		union(){
			
			//The main section
			translate([0,5,-lm8uu_h/2+height/2]) cube([rod_sep*2,thick,height],center=true);


			//Tensioner Block
			translate([ten_pos,0,-lm8uu_h/2+height/2+1.5]) cube([10,5,height+3],center=true);

			//Connectors
			translate([0,cubey,-lm8uu_h/2+height/2-10/4]) connector();

			//Endstop button?
			//translate([arm_sep-swivel_sep/2,cubey*1.7,-lm8uu_h/2+height/2-10/4]) difference(){
			///	cube([cubex,cubey*.9,cubez],center=true);
			//	translate([0,-cubey/5-1,0]) rotate([0,90,0]) cylinder(r=cubez/2,h=cubex+1,center=true);
			//}
			

			for(i=[-1:2:1]){
				
				//The slots for the lm8uu
				translate([i*rod_sep,0,0]) difference(){
					cylinder(r=lm8uu_r+2,h=lm8uu_h,center=true);
					translate([0,-5,0]) cube([lm8uu_r*2+8,10,lm8uu_h+1],center=true);
				}

				//In order to get the material for the zip-tie holes
				translate([i*(rod_sep-9),5,4]) rotate([90,0,0]) cylinder(r=8,h=thick,center=true);
			}
		}

	
		//LM8UU Slot fit
		lm8uu(lm8uu_h+1);

		//Cutting away for the rounded effect
		for(i=[-1:2:1]){
			translate([i*(rod_sep-20),5,5/2+9]) rotate([90,0,0]) cylinder(r=8,h=thick+.1,center=true);
		}

		//Holes for zip-ties
		for(i=[-1:2:1],d=[-1:2:1]){
			translate([i*rod_sep,0,d*(24.12/2-4)]) rings();
		}

		//Tensioner Holes
		translate([ten_pos,0,-lm8uu_h/2+height/2]){
			translate([0,0,8]) cube([2,2,6],center=true); //spectra hole

			translate([0,-1,pos_tem]) rotate([90,0,0]) cylinder(r=M3washer/2, h=4, center=true);
			translate([0,-1,pos_tem]) rotate([90,0,0]) cylinder(r=M3h/2, h=20, center=true);
			translate([0,7,pos_tem]) rotate([90,90,0]) cylinder(r=M3nut/2, h=4, center=true, $fn=6);
		
			translate([0,0,-5]) cube([2,20,2],center=true); //top spectra hole
		}
		
		//endstop button holes
		translate([arm_sep-swivel_sep/2,cubey,-5]) cylinder(r=3.4/2,h=20,center=true);


	}
}

module rings(){
	difference(){
		cylinder(r=lm8uu_r+4,h=3,center=true);
		cylinder(r=lm8uu_r+2,h=4,center=true);
	}
}



module connector(){
	difference(){
		union(){
				
			//The initial blocks
			for(i=[-1:2:1],d=[-1:2:1]){
				translate([d*swivel_sep/2+i*arm_sep,0,0]){
					cube(cubie,center=true);
					translate([0,cubey/2,0]) rotate([0,90,0]) cylinder(r=cubez/2,h=cubex,center=true);


					//get that extra support
					difference(){
						translate([0,-cubey/2,cubez/2]) rotate([0,90,0]) cylinder(r=cubez/2,h=cubex,center=true);
						translate([0,-cubey/9+1,cubez+1]) rotate([0,90,0]) cylinder(r=cubez/1.6,h=cubex+1,center=true);
					}
				}
			}
		}
		
		//M3 holes
		translate([0,cubey/2]) rotate([0,90,0]) cylinder(r=M3h/2,h=100,center=true);
		
		//Nut holes
		for(i=[-1:2:1],d=[-1:2:1]){

			translate([arm_sep*i+swivel_sep/2*d-2*d,cubey/2,0]) rotate([90,0,90]) cylinder(r=M3nut/2,h=3,center=true,$fn=6);
		}
		
	}	
}





//DRAW
carriage();
%translate([20,18,-5]) rotate([90,90,90]) jaws();

//%translate([0,0,-100]) rotate([0,0,180]) idler_end();
%m8poles();
%lm8uu(lm8uu_h);
